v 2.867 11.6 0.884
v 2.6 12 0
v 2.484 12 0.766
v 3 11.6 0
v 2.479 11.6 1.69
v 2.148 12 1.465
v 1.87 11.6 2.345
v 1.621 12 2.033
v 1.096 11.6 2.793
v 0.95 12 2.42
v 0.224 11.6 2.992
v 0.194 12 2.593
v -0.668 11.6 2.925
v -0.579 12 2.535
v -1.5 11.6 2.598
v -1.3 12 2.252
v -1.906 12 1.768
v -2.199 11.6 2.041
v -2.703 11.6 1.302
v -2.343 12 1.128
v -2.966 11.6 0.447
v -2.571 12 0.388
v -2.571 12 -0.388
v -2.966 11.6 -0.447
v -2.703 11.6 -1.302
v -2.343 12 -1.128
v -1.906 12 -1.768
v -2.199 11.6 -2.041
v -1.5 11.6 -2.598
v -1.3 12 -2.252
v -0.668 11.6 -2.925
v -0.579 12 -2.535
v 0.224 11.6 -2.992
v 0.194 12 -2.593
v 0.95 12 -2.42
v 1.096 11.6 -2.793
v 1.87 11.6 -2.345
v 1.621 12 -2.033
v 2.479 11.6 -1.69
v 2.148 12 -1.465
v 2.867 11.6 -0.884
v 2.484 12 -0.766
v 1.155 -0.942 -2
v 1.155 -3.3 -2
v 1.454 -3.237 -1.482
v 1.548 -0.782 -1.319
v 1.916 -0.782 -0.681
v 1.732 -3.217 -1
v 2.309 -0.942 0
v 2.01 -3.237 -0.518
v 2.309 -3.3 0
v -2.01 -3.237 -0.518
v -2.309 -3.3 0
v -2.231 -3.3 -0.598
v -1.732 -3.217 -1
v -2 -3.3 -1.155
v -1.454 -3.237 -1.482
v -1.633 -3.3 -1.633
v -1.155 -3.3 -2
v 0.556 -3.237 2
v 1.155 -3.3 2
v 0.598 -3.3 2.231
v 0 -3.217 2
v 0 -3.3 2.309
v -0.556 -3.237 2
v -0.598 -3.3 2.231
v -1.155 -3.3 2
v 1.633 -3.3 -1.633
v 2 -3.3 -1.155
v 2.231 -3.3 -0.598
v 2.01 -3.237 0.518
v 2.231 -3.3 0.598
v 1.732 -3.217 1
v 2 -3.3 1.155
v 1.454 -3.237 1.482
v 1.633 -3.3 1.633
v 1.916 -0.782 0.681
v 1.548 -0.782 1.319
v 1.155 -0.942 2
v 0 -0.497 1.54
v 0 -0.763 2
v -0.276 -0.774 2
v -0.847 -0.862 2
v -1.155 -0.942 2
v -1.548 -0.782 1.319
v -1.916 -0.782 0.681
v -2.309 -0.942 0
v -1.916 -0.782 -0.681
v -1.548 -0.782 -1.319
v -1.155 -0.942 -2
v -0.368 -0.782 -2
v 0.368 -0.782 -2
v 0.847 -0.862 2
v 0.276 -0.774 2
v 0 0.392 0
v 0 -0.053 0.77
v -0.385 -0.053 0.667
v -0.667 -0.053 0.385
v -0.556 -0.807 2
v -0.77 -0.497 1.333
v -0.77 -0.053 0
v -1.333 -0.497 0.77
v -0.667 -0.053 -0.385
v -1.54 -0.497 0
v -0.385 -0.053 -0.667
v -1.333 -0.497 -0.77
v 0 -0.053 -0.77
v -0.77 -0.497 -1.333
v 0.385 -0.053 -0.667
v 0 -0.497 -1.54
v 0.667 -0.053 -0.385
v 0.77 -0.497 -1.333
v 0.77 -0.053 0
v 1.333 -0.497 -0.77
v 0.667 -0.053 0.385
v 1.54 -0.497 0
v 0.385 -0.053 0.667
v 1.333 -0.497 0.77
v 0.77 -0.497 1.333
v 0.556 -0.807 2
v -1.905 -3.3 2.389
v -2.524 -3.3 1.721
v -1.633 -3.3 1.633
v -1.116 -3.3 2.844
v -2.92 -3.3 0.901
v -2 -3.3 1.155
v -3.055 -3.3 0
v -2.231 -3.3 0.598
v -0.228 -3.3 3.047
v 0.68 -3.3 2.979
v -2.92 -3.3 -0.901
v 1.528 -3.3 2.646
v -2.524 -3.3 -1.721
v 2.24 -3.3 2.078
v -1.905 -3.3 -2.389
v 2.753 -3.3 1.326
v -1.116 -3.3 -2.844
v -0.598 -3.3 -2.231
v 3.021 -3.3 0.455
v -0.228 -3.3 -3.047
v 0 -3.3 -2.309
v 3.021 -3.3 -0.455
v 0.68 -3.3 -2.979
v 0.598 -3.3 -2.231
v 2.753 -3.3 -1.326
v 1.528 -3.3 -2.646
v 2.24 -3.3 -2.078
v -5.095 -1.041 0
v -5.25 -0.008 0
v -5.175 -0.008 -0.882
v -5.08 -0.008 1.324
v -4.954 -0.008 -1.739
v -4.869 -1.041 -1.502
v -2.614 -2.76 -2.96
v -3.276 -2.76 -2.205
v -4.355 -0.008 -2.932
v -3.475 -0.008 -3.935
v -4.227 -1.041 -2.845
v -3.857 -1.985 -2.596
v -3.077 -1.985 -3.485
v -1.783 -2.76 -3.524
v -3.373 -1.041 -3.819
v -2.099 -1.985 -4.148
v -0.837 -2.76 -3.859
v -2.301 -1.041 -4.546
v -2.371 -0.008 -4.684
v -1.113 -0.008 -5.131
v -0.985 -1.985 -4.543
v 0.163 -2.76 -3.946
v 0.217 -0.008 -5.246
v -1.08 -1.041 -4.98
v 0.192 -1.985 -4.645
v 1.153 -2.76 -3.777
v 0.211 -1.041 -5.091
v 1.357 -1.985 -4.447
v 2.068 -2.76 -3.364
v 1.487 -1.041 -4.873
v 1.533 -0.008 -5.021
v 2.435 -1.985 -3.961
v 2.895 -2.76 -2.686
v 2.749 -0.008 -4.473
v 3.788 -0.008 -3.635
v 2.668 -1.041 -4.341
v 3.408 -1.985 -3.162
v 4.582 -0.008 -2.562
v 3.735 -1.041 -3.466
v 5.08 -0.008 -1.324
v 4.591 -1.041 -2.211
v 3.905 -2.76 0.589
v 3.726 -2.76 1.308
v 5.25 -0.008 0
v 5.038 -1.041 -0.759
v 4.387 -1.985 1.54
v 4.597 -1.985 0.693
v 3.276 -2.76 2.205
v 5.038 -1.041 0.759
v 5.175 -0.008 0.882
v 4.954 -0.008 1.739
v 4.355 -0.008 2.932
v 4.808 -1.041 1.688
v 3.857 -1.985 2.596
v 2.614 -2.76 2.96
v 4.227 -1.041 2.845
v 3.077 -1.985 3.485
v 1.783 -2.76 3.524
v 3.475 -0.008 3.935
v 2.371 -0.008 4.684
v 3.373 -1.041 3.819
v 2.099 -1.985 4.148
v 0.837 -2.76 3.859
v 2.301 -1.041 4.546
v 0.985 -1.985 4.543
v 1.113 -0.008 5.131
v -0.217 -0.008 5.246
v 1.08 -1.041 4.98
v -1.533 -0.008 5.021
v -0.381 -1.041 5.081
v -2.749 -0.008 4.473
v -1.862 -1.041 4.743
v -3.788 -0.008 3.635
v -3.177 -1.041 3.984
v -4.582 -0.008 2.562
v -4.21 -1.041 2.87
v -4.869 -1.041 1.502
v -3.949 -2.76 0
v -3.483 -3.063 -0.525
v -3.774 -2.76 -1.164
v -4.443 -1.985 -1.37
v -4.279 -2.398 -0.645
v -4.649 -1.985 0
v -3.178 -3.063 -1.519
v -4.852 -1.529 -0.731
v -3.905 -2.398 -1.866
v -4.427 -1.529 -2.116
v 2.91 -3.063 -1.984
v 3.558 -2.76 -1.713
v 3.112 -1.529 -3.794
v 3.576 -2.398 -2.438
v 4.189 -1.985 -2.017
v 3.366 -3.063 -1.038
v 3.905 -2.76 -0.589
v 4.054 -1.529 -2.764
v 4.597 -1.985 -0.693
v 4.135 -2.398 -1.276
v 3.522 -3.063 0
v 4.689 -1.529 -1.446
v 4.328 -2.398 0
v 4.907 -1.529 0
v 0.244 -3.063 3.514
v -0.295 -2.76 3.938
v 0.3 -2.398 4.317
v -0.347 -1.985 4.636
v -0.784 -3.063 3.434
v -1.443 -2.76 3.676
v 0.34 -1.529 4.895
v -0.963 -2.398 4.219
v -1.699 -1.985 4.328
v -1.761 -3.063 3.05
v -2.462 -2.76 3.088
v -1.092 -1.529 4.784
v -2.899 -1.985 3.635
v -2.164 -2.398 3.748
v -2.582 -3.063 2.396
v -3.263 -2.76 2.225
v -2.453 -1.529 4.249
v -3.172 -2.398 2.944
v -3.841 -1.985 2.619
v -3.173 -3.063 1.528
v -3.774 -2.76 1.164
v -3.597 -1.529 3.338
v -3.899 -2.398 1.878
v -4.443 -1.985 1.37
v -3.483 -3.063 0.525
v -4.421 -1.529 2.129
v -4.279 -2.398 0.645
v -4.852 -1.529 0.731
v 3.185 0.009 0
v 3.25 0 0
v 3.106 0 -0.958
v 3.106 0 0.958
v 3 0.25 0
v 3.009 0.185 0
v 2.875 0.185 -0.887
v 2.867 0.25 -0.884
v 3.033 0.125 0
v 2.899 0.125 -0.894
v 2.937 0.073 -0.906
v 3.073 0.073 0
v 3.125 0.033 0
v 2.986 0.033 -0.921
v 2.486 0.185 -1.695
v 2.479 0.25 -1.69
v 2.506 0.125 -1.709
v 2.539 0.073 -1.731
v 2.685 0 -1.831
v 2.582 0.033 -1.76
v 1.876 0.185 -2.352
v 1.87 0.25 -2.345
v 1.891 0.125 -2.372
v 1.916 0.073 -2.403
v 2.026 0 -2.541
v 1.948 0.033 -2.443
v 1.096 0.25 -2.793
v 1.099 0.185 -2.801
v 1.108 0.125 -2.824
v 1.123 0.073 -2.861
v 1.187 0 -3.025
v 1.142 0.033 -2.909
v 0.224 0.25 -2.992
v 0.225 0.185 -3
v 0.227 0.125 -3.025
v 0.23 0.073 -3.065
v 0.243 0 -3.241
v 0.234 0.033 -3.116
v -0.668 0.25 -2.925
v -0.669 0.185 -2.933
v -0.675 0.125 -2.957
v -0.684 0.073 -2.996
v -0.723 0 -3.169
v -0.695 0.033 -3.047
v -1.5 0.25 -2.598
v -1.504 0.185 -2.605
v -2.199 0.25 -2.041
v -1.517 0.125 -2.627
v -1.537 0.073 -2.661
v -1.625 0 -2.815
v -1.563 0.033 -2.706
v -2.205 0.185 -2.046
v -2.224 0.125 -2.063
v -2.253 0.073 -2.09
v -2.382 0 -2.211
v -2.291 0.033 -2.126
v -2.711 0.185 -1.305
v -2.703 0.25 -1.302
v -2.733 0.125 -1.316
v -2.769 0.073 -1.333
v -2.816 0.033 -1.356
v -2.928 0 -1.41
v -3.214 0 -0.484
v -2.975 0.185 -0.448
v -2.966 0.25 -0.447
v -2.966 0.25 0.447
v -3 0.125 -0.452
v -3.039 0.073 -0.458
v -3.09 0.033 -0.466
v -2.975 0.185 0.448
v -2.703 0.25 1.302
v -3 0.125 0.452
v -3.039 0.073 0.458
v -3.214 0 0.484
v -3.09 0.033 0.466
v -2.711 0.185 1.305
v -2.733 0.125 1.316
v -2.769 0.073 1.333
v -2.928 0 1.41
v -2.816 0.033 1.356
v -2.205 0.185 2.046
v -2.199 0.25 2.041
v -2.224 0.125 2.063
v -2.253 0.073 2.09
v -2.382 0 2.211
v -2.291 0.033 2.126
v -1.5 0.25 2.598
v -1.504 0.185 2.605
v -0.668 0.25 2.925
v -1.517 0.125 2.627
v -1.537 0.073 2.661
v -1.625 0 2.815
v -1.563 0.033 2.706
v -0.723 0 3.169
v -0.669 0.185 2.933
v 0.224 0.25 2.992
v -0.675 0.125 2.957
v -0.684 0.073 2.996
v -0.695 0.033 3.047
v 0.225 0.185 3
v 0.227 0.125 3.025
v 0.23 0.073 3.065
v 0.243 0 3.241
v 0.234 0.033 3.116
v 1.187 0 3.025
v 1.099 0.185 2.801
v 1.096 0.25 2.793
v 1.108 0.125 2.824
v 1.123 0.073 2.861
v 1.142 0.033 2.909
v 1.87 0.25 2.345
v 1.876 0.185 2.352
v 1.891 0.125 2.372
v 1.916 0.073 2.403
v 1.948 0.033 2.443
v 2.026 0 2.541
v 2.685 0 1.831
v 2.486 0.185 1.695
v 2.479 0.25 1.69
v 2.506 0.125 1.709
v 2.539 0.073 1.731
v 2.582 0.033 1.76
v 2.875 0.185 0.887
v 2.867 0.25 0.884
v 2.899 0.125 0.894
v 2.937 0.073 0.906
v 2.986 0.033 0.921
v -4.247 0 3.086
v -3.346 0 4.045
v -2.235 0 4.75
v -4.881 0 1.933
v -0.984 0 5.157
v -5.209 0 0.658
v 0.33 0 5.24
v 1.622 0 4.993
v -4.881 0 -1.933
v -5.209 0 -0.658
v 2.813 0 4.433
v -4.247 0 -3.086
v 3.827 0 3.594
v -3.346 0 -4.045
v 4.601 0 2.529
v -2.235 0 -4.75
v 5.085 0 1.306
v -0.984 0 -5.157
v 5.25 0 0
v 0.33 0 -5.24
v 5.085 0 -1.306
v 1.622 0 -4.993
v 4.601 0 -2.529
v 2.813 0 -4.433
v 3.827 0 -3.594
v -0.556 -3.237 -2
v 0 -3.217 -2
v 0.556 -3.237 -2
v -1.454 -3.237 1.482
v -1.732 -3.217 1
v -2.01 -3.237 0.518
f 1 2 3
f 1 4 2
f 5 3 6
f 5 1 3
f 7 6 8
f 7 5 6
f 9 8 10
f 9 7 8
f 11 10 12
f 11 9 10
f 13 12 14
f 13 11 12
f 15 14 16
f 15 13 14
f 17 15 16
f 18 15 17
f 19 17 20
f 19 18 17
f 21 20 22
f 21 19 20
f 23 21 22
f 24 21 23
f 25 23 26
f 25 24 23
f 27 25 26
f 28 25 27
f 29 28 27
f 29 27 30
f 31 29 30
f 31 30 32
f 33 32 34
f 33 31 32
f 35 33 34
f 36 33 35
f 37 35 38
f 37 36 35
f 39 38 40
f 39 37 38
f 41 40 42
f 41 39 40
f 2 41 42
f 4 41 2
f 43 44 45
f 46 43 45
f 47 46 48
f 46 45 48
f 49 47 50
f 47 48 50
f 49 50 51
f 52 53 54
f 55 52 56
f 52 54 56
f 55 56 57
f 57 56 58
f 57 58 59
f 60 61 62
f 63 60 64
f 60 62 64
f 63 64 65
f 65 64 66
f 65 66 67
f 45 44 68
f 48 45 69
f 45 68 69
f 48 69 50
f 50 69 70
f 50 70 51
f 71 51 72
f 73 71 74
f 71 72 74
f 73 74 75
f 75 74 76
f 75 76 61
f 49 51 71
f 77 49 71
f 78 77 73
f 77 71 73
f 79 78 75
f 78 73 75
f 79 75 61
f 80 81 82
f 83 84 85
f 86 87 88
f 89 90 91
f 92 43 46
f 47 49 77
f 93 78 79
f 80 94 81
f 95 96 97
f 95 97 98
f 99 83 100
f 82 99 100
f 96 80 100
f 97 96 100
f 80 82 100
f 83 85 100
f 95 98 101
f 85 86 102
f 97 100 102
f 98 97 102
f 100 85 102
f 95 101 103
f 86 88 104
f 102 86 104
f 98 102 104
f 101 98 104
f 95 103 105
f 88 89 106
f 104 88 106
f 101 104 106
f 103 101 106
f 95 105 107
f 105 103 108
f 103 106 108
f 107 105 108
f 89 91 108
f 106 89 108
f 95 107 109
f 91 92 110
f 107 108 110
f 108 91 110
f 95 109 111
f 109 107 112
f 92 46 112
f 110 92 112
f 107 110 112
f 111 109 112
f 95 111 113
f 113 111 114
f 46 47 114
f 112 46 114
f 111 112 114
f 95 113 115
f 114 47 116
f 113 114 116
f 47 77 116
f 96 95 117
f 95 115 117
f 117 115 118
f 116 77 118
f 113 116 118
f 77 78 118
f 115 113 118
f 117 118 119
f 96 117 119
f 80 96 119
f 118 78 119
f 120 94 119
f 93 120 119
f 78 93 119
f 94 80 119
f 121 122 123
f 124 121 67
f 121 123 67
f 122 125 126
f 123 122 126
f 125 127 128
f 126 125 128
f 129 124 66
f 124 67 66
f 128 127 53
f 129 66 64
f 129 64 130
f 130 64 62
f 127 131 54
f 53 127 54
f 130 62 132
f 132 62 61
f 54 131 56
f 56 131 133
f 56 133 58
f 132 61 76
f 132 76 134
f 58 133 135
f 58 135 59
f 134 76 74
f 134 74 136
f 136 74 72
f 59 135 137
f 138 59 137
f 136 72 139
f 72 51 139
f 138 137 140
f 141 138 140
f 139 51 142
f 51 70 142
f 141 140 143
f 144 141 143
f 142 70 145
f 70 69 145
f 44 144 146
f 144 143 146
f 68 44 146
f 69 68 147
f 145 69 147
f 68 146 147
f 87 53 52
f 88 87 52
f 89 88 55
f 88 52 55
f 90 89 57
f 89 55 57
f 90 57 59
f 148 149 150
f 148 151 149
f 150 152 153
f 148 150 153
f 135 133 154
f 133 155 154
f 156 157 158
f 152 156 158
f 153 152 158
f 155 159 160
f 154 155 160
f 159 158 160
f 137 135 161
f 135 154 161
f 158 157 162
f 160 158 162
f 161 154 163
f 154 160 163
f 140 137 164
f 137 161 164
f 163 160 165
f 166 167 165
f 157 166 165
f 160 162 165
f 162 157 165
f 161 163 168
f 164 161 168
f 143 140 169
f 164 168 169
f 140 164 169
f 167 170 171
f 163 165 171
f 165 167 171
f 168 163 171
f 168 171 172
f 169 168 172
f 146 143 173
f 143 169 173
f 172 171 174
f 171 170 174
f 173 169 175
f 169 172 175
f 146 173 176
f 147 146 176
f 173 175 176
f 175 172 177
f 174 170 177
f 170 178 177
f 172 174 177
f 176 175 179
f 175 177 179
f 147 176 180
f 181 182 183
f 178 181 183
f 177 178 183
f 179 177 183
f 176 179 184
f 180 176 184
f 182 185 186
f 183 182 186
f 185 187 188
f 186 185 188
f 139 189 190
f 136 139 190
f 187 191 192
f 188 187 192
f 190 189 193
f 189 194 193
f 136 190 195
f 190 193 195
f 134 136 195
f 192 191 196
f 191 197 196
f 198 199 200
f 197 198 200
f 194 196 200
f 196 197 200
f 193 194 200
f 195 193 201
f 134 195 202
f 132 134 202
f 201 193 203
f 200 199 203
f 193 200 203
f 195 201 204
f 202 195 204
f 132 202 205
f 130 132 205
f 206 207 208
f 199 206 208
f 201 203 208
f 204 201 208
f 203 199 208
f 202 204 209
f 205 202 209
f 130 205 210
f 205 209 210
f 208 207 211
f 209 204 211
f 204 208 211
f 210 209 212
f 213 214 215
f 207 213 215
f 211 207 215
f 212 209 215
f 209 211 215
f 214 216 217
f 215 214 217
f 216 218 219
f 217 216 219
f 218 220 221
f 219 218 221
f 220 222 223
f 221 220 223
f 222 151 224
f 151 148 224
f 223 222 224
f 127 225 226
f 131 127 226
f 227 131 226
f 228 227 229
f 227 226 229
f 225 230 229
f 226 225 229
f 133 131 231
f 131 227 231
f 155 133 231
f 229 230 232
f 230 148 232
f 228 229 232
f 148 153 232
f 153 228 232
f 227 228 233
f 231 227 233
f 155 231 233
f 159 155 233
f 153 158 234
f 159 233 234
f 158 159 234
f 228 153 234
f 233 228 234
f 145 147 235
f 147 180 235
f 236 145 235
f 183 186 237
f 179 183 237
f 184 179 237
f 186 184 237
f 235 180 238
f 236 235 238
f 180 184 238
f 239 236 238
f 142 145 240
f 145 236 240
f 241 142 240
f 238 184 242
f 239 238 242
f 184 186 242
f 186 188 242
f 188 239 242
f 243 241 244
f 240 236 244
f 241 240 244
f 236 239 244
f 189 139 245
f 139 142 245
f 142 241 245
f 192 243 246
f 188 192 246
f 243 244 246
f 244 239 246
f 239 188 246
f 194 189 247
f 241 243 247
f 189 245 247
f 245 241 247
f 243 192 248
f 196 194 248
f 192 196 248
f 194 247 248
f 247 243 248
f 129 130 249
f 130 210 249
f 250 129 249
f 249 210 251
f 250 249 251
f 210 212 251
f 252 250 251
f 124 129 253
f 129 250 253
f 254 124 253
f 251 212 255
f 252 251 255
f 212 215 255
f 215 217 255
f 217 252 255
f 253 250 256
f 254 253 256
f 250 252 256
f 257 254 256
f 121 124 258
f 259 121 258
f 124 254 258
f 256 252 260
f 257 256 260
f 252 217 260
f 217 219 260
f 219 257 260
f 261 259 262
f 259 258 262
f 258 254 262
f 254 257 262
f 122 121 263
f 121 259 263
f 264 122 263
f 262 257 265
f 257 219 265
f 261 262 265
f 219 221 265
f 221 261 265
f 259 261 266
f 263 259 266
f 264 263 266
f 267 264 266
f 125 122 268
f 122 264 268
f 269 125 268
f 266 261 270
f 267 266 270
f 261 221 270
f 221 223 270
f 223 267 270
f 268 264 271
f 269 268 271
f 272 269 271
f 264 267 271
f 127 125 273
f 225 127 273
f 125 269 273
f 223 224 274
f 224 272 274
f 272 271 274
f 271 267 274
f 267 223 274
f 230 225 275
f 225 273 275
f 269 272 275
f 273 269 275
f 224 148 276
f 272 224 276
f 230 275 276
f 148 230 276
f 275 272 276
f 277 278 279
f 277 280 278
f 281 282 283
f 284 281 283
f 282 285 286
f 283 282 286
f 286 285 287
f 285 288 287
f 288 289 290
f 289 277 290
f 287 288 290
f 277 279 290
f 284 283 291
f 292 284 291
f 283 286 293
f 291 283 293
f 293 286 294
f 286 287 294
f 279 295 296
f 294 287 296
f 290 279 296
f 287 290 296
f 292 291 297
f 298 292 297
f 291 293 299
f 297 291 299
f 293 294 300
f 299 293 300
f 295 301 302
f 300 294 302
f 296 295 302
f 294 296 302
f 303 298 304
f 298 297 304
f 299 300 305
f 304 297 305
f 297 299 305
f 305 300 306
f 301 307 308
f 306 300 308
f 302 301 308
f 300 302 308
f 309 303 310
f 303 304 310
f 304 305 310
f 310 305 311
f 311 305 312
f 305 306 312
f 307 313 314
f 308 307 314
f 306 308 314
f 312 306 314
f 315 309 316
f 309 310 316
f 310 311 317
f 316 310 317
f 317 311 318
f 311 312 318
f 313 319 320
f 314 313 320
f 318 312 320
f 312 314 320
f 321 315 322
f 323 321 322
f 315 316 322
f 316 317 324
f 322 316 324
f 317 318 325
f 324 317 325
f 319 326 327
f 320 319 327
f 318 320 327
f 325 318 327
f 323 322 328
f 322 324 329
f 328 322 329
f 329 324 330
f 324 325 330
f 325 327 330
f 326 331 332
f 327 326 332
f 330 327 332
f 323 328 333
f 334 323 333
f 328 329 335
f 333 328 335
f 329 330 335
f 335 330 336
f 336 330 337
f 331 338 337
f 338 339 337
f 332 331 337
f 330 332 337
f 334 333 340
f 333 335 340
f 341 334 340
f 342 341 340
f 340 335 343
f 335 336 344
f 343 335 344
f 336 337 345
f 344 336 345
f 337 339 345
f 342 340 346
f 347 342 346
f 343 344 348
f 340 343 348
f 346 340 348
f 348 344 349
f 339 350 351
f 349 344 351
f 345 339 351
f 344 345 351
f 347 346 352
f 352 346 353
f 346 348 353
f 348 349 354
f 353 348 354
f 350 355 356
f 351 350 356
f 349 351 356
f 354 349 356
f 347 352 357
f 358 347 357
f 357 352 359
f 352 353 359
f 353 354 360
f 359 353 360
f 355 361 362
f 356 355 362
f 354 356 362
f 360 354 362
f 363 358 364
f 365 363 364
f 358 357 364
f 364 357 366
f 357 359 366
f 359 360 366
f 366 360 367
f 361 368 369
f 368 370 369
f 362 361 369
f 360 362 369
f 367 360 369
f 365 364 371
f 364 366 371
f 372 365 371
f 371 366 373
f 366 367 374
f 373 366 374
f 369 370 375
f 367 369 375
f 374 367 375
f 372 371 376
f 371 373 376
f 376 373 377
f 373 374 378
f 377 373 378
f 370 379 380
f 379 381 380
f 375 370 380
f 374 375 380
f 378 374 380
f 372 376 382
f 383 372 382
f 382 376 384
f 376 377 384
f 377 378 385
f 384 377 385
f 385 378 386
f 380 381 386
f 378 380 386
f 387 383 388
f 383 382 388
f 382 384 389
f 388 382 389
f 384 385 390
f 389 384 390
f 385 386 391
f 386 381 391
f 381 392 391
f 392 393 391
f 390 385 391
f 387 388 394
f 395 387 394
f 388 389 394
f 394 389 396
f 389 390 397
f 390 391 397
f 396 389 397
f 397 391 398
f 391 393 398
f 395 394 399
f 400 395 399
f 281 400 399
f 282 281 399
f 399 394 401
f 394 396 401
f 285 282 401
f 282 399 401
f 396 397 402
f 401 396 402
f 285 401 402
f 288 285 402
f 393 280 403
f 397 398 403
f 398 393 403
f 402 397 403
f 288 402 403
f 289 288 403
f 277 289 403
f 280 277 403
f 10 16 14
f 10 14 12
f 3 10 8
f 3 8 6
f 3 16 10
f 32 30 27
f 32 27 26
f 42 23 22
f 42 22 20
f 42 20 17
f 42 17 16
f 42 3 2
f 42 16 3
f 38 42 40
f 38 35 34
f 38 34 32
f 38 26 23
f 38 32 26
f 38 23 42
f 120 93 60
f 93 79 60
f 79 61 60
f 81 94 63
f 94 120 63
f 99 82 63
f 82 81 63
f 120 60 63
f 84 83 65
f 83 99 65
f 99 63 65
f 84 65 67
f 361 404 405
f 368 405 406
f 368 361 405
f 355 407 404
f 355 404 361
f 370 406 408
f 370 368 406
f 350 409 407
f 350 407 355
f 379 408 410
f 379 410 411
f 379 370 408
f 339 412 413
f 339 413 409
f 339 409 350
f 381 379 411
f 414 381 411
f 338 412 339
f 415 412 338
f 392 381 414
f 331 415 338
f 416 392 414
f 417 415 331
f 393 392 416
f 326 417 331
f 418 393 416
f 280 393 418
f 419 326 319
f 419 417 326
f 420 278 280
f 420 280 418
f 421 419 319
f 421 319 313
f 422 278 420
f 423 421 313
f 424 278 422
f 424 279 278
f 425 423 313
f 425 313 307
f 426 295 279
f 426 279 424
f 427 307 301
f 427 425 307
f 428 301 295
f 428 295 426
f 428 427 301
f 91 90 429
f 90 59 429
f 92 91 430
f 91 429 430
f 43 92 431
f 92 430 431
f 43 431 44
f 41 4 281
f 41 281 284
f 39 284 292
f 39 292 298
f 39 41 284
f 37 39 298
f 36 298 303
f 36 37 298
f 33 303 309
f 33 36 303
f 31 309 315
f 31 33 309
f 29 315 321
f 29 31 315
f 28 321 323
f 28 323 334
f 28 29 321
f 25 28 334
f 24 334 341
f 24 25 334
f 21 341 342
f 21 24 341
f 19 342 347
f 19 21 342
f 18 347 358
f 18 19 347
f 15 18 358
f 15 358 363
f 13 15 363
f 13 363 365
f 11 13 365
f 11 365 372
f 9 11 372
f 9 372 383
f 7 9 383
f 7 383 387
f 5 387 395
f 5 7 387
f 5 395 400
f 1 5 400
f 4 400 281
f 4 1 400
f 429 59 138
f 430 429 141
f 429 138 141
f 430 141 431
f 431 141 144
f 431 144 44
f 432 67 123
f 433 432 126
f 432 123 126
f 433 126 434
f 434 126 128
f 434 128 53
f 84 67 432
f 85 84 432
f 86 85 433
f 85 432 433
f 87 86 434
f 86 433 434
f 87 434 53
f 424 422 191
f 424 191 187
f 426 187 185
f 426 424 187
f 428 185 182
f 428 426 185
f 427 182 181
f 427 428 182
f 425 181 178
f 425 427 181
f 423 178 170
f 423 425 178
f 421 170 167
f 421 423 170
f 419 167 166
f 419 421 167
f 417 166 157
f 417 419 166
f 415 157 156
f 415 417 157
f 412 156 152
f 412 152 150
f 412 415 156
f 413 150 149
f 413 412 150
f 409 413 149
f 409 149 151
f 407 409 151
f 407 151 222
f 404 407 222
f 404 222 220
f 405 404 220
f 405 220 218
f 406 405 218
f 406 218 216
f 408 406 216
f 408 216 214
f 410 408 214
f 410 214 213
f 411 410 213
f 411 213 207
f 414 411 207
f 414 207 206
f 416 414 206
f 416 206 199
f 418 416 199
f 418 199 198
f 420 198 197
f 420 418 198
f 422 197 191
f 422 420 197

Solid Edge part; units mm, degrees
sketch "Sketch1" plane through (0, 0, 0) normal (0, 0, 1) x (1, 0, 0)
  line L0 (3, 0) -> (3, 12)
  line L1 (0, 12) -> (3, 12)
  line L2 (0, 0) -> (0, 12)
  line L3 (0, 0) -> (0, -3.3)
  line L4 (0, -3.3) -> (5.25, -3.3)
  line L5 (5.25, -3.3) -> (5.25, 0)
  line L6 (5.25, 0) -> (3, 0)
revolve "RevolvedProtrusion1" add sketch "Sketch1" angle 360 about axis through (0, 0, 0) along (0, 1, 0)
sketch "Sketch2" plane through (0, 0, 0) normal (1, 0, 0) x (0, 1, 0)
  line L0 (-3.3, 2.7915) -> (-1.22, 2.7915)
  line L1 (0.3917, 0) -> (-1.22, 2.7915)
  line L2 (-3.3, 0) -> (0.3917, 0)
  line L3 (-3.3, 0) -> (-3.3, 2.7915)
revolve "RevolvedCutout1" cut sketch "Sketch2" angle 360 about axis through (0, -4.5, 0) along (0, 1, 0)
sketch "Sketch3" plane through (0, -3.3, 0) normal (0, -1, 0) x (0, 0, 1)
  circle A0 centre (0, 0) radius 2.7915
  line L0 (-2, -1.1547) -> (0, -2.3094)
  line L1 (0, -2.3094) -> (2, -1.1547)
  line L2 (2, -1.1547) -> (2, 1.1547)
  line L3 (2, 1.1547) -> (0, 2.3094)
  line L4 (0, 2.3094) -> (-2, 1.1547)
  line L5 (-2, 1.1547) -> (-2, -1.1547)
  dimension "D1" = 4
extrude "Protrusion1" add sketch "Sketch3" against normal up to next
sketch "Sketch4" plane through (0, 0, 0) normal (0, 0, 1) x (1, 0, 0)
  line L0 (-2.3094, -3.3) -> (0, -3.3)
  line L1 (0, -3.3) -> (0, -2.6812)
  line L2 (0, -2.6812) -> (-2.3094, -3.3)
revolve "RevolvedCutout2" cut sketch "Sketch4" angle 360 about axis through (0, -4.5, 0) along (0, 1, 0)
fillet "Round1" radius 0.25 1 edges at (0, 0, -3)
chamfer "倒斜角_2" distance 0.4 angle 45 1 edges at (0, 12, -3)
cosmetic_thread "螺纹_3" size "M6" thread depth 10
sketch "Sketch5" plane through (0, 0, 0) normal (0, 0, 1) x (1, 0, 0)
  arc A0 (-3.0553, -3.3) -> (-5.25, 0) centre (-1.6717, 0) cw
revolve "RevolvedCutout3" cut sketch "Sketch5" angle 360 about axis through (0, 0, 0) along (0, -1, 0) material side at (-4.6929, -2.0093, 0)
